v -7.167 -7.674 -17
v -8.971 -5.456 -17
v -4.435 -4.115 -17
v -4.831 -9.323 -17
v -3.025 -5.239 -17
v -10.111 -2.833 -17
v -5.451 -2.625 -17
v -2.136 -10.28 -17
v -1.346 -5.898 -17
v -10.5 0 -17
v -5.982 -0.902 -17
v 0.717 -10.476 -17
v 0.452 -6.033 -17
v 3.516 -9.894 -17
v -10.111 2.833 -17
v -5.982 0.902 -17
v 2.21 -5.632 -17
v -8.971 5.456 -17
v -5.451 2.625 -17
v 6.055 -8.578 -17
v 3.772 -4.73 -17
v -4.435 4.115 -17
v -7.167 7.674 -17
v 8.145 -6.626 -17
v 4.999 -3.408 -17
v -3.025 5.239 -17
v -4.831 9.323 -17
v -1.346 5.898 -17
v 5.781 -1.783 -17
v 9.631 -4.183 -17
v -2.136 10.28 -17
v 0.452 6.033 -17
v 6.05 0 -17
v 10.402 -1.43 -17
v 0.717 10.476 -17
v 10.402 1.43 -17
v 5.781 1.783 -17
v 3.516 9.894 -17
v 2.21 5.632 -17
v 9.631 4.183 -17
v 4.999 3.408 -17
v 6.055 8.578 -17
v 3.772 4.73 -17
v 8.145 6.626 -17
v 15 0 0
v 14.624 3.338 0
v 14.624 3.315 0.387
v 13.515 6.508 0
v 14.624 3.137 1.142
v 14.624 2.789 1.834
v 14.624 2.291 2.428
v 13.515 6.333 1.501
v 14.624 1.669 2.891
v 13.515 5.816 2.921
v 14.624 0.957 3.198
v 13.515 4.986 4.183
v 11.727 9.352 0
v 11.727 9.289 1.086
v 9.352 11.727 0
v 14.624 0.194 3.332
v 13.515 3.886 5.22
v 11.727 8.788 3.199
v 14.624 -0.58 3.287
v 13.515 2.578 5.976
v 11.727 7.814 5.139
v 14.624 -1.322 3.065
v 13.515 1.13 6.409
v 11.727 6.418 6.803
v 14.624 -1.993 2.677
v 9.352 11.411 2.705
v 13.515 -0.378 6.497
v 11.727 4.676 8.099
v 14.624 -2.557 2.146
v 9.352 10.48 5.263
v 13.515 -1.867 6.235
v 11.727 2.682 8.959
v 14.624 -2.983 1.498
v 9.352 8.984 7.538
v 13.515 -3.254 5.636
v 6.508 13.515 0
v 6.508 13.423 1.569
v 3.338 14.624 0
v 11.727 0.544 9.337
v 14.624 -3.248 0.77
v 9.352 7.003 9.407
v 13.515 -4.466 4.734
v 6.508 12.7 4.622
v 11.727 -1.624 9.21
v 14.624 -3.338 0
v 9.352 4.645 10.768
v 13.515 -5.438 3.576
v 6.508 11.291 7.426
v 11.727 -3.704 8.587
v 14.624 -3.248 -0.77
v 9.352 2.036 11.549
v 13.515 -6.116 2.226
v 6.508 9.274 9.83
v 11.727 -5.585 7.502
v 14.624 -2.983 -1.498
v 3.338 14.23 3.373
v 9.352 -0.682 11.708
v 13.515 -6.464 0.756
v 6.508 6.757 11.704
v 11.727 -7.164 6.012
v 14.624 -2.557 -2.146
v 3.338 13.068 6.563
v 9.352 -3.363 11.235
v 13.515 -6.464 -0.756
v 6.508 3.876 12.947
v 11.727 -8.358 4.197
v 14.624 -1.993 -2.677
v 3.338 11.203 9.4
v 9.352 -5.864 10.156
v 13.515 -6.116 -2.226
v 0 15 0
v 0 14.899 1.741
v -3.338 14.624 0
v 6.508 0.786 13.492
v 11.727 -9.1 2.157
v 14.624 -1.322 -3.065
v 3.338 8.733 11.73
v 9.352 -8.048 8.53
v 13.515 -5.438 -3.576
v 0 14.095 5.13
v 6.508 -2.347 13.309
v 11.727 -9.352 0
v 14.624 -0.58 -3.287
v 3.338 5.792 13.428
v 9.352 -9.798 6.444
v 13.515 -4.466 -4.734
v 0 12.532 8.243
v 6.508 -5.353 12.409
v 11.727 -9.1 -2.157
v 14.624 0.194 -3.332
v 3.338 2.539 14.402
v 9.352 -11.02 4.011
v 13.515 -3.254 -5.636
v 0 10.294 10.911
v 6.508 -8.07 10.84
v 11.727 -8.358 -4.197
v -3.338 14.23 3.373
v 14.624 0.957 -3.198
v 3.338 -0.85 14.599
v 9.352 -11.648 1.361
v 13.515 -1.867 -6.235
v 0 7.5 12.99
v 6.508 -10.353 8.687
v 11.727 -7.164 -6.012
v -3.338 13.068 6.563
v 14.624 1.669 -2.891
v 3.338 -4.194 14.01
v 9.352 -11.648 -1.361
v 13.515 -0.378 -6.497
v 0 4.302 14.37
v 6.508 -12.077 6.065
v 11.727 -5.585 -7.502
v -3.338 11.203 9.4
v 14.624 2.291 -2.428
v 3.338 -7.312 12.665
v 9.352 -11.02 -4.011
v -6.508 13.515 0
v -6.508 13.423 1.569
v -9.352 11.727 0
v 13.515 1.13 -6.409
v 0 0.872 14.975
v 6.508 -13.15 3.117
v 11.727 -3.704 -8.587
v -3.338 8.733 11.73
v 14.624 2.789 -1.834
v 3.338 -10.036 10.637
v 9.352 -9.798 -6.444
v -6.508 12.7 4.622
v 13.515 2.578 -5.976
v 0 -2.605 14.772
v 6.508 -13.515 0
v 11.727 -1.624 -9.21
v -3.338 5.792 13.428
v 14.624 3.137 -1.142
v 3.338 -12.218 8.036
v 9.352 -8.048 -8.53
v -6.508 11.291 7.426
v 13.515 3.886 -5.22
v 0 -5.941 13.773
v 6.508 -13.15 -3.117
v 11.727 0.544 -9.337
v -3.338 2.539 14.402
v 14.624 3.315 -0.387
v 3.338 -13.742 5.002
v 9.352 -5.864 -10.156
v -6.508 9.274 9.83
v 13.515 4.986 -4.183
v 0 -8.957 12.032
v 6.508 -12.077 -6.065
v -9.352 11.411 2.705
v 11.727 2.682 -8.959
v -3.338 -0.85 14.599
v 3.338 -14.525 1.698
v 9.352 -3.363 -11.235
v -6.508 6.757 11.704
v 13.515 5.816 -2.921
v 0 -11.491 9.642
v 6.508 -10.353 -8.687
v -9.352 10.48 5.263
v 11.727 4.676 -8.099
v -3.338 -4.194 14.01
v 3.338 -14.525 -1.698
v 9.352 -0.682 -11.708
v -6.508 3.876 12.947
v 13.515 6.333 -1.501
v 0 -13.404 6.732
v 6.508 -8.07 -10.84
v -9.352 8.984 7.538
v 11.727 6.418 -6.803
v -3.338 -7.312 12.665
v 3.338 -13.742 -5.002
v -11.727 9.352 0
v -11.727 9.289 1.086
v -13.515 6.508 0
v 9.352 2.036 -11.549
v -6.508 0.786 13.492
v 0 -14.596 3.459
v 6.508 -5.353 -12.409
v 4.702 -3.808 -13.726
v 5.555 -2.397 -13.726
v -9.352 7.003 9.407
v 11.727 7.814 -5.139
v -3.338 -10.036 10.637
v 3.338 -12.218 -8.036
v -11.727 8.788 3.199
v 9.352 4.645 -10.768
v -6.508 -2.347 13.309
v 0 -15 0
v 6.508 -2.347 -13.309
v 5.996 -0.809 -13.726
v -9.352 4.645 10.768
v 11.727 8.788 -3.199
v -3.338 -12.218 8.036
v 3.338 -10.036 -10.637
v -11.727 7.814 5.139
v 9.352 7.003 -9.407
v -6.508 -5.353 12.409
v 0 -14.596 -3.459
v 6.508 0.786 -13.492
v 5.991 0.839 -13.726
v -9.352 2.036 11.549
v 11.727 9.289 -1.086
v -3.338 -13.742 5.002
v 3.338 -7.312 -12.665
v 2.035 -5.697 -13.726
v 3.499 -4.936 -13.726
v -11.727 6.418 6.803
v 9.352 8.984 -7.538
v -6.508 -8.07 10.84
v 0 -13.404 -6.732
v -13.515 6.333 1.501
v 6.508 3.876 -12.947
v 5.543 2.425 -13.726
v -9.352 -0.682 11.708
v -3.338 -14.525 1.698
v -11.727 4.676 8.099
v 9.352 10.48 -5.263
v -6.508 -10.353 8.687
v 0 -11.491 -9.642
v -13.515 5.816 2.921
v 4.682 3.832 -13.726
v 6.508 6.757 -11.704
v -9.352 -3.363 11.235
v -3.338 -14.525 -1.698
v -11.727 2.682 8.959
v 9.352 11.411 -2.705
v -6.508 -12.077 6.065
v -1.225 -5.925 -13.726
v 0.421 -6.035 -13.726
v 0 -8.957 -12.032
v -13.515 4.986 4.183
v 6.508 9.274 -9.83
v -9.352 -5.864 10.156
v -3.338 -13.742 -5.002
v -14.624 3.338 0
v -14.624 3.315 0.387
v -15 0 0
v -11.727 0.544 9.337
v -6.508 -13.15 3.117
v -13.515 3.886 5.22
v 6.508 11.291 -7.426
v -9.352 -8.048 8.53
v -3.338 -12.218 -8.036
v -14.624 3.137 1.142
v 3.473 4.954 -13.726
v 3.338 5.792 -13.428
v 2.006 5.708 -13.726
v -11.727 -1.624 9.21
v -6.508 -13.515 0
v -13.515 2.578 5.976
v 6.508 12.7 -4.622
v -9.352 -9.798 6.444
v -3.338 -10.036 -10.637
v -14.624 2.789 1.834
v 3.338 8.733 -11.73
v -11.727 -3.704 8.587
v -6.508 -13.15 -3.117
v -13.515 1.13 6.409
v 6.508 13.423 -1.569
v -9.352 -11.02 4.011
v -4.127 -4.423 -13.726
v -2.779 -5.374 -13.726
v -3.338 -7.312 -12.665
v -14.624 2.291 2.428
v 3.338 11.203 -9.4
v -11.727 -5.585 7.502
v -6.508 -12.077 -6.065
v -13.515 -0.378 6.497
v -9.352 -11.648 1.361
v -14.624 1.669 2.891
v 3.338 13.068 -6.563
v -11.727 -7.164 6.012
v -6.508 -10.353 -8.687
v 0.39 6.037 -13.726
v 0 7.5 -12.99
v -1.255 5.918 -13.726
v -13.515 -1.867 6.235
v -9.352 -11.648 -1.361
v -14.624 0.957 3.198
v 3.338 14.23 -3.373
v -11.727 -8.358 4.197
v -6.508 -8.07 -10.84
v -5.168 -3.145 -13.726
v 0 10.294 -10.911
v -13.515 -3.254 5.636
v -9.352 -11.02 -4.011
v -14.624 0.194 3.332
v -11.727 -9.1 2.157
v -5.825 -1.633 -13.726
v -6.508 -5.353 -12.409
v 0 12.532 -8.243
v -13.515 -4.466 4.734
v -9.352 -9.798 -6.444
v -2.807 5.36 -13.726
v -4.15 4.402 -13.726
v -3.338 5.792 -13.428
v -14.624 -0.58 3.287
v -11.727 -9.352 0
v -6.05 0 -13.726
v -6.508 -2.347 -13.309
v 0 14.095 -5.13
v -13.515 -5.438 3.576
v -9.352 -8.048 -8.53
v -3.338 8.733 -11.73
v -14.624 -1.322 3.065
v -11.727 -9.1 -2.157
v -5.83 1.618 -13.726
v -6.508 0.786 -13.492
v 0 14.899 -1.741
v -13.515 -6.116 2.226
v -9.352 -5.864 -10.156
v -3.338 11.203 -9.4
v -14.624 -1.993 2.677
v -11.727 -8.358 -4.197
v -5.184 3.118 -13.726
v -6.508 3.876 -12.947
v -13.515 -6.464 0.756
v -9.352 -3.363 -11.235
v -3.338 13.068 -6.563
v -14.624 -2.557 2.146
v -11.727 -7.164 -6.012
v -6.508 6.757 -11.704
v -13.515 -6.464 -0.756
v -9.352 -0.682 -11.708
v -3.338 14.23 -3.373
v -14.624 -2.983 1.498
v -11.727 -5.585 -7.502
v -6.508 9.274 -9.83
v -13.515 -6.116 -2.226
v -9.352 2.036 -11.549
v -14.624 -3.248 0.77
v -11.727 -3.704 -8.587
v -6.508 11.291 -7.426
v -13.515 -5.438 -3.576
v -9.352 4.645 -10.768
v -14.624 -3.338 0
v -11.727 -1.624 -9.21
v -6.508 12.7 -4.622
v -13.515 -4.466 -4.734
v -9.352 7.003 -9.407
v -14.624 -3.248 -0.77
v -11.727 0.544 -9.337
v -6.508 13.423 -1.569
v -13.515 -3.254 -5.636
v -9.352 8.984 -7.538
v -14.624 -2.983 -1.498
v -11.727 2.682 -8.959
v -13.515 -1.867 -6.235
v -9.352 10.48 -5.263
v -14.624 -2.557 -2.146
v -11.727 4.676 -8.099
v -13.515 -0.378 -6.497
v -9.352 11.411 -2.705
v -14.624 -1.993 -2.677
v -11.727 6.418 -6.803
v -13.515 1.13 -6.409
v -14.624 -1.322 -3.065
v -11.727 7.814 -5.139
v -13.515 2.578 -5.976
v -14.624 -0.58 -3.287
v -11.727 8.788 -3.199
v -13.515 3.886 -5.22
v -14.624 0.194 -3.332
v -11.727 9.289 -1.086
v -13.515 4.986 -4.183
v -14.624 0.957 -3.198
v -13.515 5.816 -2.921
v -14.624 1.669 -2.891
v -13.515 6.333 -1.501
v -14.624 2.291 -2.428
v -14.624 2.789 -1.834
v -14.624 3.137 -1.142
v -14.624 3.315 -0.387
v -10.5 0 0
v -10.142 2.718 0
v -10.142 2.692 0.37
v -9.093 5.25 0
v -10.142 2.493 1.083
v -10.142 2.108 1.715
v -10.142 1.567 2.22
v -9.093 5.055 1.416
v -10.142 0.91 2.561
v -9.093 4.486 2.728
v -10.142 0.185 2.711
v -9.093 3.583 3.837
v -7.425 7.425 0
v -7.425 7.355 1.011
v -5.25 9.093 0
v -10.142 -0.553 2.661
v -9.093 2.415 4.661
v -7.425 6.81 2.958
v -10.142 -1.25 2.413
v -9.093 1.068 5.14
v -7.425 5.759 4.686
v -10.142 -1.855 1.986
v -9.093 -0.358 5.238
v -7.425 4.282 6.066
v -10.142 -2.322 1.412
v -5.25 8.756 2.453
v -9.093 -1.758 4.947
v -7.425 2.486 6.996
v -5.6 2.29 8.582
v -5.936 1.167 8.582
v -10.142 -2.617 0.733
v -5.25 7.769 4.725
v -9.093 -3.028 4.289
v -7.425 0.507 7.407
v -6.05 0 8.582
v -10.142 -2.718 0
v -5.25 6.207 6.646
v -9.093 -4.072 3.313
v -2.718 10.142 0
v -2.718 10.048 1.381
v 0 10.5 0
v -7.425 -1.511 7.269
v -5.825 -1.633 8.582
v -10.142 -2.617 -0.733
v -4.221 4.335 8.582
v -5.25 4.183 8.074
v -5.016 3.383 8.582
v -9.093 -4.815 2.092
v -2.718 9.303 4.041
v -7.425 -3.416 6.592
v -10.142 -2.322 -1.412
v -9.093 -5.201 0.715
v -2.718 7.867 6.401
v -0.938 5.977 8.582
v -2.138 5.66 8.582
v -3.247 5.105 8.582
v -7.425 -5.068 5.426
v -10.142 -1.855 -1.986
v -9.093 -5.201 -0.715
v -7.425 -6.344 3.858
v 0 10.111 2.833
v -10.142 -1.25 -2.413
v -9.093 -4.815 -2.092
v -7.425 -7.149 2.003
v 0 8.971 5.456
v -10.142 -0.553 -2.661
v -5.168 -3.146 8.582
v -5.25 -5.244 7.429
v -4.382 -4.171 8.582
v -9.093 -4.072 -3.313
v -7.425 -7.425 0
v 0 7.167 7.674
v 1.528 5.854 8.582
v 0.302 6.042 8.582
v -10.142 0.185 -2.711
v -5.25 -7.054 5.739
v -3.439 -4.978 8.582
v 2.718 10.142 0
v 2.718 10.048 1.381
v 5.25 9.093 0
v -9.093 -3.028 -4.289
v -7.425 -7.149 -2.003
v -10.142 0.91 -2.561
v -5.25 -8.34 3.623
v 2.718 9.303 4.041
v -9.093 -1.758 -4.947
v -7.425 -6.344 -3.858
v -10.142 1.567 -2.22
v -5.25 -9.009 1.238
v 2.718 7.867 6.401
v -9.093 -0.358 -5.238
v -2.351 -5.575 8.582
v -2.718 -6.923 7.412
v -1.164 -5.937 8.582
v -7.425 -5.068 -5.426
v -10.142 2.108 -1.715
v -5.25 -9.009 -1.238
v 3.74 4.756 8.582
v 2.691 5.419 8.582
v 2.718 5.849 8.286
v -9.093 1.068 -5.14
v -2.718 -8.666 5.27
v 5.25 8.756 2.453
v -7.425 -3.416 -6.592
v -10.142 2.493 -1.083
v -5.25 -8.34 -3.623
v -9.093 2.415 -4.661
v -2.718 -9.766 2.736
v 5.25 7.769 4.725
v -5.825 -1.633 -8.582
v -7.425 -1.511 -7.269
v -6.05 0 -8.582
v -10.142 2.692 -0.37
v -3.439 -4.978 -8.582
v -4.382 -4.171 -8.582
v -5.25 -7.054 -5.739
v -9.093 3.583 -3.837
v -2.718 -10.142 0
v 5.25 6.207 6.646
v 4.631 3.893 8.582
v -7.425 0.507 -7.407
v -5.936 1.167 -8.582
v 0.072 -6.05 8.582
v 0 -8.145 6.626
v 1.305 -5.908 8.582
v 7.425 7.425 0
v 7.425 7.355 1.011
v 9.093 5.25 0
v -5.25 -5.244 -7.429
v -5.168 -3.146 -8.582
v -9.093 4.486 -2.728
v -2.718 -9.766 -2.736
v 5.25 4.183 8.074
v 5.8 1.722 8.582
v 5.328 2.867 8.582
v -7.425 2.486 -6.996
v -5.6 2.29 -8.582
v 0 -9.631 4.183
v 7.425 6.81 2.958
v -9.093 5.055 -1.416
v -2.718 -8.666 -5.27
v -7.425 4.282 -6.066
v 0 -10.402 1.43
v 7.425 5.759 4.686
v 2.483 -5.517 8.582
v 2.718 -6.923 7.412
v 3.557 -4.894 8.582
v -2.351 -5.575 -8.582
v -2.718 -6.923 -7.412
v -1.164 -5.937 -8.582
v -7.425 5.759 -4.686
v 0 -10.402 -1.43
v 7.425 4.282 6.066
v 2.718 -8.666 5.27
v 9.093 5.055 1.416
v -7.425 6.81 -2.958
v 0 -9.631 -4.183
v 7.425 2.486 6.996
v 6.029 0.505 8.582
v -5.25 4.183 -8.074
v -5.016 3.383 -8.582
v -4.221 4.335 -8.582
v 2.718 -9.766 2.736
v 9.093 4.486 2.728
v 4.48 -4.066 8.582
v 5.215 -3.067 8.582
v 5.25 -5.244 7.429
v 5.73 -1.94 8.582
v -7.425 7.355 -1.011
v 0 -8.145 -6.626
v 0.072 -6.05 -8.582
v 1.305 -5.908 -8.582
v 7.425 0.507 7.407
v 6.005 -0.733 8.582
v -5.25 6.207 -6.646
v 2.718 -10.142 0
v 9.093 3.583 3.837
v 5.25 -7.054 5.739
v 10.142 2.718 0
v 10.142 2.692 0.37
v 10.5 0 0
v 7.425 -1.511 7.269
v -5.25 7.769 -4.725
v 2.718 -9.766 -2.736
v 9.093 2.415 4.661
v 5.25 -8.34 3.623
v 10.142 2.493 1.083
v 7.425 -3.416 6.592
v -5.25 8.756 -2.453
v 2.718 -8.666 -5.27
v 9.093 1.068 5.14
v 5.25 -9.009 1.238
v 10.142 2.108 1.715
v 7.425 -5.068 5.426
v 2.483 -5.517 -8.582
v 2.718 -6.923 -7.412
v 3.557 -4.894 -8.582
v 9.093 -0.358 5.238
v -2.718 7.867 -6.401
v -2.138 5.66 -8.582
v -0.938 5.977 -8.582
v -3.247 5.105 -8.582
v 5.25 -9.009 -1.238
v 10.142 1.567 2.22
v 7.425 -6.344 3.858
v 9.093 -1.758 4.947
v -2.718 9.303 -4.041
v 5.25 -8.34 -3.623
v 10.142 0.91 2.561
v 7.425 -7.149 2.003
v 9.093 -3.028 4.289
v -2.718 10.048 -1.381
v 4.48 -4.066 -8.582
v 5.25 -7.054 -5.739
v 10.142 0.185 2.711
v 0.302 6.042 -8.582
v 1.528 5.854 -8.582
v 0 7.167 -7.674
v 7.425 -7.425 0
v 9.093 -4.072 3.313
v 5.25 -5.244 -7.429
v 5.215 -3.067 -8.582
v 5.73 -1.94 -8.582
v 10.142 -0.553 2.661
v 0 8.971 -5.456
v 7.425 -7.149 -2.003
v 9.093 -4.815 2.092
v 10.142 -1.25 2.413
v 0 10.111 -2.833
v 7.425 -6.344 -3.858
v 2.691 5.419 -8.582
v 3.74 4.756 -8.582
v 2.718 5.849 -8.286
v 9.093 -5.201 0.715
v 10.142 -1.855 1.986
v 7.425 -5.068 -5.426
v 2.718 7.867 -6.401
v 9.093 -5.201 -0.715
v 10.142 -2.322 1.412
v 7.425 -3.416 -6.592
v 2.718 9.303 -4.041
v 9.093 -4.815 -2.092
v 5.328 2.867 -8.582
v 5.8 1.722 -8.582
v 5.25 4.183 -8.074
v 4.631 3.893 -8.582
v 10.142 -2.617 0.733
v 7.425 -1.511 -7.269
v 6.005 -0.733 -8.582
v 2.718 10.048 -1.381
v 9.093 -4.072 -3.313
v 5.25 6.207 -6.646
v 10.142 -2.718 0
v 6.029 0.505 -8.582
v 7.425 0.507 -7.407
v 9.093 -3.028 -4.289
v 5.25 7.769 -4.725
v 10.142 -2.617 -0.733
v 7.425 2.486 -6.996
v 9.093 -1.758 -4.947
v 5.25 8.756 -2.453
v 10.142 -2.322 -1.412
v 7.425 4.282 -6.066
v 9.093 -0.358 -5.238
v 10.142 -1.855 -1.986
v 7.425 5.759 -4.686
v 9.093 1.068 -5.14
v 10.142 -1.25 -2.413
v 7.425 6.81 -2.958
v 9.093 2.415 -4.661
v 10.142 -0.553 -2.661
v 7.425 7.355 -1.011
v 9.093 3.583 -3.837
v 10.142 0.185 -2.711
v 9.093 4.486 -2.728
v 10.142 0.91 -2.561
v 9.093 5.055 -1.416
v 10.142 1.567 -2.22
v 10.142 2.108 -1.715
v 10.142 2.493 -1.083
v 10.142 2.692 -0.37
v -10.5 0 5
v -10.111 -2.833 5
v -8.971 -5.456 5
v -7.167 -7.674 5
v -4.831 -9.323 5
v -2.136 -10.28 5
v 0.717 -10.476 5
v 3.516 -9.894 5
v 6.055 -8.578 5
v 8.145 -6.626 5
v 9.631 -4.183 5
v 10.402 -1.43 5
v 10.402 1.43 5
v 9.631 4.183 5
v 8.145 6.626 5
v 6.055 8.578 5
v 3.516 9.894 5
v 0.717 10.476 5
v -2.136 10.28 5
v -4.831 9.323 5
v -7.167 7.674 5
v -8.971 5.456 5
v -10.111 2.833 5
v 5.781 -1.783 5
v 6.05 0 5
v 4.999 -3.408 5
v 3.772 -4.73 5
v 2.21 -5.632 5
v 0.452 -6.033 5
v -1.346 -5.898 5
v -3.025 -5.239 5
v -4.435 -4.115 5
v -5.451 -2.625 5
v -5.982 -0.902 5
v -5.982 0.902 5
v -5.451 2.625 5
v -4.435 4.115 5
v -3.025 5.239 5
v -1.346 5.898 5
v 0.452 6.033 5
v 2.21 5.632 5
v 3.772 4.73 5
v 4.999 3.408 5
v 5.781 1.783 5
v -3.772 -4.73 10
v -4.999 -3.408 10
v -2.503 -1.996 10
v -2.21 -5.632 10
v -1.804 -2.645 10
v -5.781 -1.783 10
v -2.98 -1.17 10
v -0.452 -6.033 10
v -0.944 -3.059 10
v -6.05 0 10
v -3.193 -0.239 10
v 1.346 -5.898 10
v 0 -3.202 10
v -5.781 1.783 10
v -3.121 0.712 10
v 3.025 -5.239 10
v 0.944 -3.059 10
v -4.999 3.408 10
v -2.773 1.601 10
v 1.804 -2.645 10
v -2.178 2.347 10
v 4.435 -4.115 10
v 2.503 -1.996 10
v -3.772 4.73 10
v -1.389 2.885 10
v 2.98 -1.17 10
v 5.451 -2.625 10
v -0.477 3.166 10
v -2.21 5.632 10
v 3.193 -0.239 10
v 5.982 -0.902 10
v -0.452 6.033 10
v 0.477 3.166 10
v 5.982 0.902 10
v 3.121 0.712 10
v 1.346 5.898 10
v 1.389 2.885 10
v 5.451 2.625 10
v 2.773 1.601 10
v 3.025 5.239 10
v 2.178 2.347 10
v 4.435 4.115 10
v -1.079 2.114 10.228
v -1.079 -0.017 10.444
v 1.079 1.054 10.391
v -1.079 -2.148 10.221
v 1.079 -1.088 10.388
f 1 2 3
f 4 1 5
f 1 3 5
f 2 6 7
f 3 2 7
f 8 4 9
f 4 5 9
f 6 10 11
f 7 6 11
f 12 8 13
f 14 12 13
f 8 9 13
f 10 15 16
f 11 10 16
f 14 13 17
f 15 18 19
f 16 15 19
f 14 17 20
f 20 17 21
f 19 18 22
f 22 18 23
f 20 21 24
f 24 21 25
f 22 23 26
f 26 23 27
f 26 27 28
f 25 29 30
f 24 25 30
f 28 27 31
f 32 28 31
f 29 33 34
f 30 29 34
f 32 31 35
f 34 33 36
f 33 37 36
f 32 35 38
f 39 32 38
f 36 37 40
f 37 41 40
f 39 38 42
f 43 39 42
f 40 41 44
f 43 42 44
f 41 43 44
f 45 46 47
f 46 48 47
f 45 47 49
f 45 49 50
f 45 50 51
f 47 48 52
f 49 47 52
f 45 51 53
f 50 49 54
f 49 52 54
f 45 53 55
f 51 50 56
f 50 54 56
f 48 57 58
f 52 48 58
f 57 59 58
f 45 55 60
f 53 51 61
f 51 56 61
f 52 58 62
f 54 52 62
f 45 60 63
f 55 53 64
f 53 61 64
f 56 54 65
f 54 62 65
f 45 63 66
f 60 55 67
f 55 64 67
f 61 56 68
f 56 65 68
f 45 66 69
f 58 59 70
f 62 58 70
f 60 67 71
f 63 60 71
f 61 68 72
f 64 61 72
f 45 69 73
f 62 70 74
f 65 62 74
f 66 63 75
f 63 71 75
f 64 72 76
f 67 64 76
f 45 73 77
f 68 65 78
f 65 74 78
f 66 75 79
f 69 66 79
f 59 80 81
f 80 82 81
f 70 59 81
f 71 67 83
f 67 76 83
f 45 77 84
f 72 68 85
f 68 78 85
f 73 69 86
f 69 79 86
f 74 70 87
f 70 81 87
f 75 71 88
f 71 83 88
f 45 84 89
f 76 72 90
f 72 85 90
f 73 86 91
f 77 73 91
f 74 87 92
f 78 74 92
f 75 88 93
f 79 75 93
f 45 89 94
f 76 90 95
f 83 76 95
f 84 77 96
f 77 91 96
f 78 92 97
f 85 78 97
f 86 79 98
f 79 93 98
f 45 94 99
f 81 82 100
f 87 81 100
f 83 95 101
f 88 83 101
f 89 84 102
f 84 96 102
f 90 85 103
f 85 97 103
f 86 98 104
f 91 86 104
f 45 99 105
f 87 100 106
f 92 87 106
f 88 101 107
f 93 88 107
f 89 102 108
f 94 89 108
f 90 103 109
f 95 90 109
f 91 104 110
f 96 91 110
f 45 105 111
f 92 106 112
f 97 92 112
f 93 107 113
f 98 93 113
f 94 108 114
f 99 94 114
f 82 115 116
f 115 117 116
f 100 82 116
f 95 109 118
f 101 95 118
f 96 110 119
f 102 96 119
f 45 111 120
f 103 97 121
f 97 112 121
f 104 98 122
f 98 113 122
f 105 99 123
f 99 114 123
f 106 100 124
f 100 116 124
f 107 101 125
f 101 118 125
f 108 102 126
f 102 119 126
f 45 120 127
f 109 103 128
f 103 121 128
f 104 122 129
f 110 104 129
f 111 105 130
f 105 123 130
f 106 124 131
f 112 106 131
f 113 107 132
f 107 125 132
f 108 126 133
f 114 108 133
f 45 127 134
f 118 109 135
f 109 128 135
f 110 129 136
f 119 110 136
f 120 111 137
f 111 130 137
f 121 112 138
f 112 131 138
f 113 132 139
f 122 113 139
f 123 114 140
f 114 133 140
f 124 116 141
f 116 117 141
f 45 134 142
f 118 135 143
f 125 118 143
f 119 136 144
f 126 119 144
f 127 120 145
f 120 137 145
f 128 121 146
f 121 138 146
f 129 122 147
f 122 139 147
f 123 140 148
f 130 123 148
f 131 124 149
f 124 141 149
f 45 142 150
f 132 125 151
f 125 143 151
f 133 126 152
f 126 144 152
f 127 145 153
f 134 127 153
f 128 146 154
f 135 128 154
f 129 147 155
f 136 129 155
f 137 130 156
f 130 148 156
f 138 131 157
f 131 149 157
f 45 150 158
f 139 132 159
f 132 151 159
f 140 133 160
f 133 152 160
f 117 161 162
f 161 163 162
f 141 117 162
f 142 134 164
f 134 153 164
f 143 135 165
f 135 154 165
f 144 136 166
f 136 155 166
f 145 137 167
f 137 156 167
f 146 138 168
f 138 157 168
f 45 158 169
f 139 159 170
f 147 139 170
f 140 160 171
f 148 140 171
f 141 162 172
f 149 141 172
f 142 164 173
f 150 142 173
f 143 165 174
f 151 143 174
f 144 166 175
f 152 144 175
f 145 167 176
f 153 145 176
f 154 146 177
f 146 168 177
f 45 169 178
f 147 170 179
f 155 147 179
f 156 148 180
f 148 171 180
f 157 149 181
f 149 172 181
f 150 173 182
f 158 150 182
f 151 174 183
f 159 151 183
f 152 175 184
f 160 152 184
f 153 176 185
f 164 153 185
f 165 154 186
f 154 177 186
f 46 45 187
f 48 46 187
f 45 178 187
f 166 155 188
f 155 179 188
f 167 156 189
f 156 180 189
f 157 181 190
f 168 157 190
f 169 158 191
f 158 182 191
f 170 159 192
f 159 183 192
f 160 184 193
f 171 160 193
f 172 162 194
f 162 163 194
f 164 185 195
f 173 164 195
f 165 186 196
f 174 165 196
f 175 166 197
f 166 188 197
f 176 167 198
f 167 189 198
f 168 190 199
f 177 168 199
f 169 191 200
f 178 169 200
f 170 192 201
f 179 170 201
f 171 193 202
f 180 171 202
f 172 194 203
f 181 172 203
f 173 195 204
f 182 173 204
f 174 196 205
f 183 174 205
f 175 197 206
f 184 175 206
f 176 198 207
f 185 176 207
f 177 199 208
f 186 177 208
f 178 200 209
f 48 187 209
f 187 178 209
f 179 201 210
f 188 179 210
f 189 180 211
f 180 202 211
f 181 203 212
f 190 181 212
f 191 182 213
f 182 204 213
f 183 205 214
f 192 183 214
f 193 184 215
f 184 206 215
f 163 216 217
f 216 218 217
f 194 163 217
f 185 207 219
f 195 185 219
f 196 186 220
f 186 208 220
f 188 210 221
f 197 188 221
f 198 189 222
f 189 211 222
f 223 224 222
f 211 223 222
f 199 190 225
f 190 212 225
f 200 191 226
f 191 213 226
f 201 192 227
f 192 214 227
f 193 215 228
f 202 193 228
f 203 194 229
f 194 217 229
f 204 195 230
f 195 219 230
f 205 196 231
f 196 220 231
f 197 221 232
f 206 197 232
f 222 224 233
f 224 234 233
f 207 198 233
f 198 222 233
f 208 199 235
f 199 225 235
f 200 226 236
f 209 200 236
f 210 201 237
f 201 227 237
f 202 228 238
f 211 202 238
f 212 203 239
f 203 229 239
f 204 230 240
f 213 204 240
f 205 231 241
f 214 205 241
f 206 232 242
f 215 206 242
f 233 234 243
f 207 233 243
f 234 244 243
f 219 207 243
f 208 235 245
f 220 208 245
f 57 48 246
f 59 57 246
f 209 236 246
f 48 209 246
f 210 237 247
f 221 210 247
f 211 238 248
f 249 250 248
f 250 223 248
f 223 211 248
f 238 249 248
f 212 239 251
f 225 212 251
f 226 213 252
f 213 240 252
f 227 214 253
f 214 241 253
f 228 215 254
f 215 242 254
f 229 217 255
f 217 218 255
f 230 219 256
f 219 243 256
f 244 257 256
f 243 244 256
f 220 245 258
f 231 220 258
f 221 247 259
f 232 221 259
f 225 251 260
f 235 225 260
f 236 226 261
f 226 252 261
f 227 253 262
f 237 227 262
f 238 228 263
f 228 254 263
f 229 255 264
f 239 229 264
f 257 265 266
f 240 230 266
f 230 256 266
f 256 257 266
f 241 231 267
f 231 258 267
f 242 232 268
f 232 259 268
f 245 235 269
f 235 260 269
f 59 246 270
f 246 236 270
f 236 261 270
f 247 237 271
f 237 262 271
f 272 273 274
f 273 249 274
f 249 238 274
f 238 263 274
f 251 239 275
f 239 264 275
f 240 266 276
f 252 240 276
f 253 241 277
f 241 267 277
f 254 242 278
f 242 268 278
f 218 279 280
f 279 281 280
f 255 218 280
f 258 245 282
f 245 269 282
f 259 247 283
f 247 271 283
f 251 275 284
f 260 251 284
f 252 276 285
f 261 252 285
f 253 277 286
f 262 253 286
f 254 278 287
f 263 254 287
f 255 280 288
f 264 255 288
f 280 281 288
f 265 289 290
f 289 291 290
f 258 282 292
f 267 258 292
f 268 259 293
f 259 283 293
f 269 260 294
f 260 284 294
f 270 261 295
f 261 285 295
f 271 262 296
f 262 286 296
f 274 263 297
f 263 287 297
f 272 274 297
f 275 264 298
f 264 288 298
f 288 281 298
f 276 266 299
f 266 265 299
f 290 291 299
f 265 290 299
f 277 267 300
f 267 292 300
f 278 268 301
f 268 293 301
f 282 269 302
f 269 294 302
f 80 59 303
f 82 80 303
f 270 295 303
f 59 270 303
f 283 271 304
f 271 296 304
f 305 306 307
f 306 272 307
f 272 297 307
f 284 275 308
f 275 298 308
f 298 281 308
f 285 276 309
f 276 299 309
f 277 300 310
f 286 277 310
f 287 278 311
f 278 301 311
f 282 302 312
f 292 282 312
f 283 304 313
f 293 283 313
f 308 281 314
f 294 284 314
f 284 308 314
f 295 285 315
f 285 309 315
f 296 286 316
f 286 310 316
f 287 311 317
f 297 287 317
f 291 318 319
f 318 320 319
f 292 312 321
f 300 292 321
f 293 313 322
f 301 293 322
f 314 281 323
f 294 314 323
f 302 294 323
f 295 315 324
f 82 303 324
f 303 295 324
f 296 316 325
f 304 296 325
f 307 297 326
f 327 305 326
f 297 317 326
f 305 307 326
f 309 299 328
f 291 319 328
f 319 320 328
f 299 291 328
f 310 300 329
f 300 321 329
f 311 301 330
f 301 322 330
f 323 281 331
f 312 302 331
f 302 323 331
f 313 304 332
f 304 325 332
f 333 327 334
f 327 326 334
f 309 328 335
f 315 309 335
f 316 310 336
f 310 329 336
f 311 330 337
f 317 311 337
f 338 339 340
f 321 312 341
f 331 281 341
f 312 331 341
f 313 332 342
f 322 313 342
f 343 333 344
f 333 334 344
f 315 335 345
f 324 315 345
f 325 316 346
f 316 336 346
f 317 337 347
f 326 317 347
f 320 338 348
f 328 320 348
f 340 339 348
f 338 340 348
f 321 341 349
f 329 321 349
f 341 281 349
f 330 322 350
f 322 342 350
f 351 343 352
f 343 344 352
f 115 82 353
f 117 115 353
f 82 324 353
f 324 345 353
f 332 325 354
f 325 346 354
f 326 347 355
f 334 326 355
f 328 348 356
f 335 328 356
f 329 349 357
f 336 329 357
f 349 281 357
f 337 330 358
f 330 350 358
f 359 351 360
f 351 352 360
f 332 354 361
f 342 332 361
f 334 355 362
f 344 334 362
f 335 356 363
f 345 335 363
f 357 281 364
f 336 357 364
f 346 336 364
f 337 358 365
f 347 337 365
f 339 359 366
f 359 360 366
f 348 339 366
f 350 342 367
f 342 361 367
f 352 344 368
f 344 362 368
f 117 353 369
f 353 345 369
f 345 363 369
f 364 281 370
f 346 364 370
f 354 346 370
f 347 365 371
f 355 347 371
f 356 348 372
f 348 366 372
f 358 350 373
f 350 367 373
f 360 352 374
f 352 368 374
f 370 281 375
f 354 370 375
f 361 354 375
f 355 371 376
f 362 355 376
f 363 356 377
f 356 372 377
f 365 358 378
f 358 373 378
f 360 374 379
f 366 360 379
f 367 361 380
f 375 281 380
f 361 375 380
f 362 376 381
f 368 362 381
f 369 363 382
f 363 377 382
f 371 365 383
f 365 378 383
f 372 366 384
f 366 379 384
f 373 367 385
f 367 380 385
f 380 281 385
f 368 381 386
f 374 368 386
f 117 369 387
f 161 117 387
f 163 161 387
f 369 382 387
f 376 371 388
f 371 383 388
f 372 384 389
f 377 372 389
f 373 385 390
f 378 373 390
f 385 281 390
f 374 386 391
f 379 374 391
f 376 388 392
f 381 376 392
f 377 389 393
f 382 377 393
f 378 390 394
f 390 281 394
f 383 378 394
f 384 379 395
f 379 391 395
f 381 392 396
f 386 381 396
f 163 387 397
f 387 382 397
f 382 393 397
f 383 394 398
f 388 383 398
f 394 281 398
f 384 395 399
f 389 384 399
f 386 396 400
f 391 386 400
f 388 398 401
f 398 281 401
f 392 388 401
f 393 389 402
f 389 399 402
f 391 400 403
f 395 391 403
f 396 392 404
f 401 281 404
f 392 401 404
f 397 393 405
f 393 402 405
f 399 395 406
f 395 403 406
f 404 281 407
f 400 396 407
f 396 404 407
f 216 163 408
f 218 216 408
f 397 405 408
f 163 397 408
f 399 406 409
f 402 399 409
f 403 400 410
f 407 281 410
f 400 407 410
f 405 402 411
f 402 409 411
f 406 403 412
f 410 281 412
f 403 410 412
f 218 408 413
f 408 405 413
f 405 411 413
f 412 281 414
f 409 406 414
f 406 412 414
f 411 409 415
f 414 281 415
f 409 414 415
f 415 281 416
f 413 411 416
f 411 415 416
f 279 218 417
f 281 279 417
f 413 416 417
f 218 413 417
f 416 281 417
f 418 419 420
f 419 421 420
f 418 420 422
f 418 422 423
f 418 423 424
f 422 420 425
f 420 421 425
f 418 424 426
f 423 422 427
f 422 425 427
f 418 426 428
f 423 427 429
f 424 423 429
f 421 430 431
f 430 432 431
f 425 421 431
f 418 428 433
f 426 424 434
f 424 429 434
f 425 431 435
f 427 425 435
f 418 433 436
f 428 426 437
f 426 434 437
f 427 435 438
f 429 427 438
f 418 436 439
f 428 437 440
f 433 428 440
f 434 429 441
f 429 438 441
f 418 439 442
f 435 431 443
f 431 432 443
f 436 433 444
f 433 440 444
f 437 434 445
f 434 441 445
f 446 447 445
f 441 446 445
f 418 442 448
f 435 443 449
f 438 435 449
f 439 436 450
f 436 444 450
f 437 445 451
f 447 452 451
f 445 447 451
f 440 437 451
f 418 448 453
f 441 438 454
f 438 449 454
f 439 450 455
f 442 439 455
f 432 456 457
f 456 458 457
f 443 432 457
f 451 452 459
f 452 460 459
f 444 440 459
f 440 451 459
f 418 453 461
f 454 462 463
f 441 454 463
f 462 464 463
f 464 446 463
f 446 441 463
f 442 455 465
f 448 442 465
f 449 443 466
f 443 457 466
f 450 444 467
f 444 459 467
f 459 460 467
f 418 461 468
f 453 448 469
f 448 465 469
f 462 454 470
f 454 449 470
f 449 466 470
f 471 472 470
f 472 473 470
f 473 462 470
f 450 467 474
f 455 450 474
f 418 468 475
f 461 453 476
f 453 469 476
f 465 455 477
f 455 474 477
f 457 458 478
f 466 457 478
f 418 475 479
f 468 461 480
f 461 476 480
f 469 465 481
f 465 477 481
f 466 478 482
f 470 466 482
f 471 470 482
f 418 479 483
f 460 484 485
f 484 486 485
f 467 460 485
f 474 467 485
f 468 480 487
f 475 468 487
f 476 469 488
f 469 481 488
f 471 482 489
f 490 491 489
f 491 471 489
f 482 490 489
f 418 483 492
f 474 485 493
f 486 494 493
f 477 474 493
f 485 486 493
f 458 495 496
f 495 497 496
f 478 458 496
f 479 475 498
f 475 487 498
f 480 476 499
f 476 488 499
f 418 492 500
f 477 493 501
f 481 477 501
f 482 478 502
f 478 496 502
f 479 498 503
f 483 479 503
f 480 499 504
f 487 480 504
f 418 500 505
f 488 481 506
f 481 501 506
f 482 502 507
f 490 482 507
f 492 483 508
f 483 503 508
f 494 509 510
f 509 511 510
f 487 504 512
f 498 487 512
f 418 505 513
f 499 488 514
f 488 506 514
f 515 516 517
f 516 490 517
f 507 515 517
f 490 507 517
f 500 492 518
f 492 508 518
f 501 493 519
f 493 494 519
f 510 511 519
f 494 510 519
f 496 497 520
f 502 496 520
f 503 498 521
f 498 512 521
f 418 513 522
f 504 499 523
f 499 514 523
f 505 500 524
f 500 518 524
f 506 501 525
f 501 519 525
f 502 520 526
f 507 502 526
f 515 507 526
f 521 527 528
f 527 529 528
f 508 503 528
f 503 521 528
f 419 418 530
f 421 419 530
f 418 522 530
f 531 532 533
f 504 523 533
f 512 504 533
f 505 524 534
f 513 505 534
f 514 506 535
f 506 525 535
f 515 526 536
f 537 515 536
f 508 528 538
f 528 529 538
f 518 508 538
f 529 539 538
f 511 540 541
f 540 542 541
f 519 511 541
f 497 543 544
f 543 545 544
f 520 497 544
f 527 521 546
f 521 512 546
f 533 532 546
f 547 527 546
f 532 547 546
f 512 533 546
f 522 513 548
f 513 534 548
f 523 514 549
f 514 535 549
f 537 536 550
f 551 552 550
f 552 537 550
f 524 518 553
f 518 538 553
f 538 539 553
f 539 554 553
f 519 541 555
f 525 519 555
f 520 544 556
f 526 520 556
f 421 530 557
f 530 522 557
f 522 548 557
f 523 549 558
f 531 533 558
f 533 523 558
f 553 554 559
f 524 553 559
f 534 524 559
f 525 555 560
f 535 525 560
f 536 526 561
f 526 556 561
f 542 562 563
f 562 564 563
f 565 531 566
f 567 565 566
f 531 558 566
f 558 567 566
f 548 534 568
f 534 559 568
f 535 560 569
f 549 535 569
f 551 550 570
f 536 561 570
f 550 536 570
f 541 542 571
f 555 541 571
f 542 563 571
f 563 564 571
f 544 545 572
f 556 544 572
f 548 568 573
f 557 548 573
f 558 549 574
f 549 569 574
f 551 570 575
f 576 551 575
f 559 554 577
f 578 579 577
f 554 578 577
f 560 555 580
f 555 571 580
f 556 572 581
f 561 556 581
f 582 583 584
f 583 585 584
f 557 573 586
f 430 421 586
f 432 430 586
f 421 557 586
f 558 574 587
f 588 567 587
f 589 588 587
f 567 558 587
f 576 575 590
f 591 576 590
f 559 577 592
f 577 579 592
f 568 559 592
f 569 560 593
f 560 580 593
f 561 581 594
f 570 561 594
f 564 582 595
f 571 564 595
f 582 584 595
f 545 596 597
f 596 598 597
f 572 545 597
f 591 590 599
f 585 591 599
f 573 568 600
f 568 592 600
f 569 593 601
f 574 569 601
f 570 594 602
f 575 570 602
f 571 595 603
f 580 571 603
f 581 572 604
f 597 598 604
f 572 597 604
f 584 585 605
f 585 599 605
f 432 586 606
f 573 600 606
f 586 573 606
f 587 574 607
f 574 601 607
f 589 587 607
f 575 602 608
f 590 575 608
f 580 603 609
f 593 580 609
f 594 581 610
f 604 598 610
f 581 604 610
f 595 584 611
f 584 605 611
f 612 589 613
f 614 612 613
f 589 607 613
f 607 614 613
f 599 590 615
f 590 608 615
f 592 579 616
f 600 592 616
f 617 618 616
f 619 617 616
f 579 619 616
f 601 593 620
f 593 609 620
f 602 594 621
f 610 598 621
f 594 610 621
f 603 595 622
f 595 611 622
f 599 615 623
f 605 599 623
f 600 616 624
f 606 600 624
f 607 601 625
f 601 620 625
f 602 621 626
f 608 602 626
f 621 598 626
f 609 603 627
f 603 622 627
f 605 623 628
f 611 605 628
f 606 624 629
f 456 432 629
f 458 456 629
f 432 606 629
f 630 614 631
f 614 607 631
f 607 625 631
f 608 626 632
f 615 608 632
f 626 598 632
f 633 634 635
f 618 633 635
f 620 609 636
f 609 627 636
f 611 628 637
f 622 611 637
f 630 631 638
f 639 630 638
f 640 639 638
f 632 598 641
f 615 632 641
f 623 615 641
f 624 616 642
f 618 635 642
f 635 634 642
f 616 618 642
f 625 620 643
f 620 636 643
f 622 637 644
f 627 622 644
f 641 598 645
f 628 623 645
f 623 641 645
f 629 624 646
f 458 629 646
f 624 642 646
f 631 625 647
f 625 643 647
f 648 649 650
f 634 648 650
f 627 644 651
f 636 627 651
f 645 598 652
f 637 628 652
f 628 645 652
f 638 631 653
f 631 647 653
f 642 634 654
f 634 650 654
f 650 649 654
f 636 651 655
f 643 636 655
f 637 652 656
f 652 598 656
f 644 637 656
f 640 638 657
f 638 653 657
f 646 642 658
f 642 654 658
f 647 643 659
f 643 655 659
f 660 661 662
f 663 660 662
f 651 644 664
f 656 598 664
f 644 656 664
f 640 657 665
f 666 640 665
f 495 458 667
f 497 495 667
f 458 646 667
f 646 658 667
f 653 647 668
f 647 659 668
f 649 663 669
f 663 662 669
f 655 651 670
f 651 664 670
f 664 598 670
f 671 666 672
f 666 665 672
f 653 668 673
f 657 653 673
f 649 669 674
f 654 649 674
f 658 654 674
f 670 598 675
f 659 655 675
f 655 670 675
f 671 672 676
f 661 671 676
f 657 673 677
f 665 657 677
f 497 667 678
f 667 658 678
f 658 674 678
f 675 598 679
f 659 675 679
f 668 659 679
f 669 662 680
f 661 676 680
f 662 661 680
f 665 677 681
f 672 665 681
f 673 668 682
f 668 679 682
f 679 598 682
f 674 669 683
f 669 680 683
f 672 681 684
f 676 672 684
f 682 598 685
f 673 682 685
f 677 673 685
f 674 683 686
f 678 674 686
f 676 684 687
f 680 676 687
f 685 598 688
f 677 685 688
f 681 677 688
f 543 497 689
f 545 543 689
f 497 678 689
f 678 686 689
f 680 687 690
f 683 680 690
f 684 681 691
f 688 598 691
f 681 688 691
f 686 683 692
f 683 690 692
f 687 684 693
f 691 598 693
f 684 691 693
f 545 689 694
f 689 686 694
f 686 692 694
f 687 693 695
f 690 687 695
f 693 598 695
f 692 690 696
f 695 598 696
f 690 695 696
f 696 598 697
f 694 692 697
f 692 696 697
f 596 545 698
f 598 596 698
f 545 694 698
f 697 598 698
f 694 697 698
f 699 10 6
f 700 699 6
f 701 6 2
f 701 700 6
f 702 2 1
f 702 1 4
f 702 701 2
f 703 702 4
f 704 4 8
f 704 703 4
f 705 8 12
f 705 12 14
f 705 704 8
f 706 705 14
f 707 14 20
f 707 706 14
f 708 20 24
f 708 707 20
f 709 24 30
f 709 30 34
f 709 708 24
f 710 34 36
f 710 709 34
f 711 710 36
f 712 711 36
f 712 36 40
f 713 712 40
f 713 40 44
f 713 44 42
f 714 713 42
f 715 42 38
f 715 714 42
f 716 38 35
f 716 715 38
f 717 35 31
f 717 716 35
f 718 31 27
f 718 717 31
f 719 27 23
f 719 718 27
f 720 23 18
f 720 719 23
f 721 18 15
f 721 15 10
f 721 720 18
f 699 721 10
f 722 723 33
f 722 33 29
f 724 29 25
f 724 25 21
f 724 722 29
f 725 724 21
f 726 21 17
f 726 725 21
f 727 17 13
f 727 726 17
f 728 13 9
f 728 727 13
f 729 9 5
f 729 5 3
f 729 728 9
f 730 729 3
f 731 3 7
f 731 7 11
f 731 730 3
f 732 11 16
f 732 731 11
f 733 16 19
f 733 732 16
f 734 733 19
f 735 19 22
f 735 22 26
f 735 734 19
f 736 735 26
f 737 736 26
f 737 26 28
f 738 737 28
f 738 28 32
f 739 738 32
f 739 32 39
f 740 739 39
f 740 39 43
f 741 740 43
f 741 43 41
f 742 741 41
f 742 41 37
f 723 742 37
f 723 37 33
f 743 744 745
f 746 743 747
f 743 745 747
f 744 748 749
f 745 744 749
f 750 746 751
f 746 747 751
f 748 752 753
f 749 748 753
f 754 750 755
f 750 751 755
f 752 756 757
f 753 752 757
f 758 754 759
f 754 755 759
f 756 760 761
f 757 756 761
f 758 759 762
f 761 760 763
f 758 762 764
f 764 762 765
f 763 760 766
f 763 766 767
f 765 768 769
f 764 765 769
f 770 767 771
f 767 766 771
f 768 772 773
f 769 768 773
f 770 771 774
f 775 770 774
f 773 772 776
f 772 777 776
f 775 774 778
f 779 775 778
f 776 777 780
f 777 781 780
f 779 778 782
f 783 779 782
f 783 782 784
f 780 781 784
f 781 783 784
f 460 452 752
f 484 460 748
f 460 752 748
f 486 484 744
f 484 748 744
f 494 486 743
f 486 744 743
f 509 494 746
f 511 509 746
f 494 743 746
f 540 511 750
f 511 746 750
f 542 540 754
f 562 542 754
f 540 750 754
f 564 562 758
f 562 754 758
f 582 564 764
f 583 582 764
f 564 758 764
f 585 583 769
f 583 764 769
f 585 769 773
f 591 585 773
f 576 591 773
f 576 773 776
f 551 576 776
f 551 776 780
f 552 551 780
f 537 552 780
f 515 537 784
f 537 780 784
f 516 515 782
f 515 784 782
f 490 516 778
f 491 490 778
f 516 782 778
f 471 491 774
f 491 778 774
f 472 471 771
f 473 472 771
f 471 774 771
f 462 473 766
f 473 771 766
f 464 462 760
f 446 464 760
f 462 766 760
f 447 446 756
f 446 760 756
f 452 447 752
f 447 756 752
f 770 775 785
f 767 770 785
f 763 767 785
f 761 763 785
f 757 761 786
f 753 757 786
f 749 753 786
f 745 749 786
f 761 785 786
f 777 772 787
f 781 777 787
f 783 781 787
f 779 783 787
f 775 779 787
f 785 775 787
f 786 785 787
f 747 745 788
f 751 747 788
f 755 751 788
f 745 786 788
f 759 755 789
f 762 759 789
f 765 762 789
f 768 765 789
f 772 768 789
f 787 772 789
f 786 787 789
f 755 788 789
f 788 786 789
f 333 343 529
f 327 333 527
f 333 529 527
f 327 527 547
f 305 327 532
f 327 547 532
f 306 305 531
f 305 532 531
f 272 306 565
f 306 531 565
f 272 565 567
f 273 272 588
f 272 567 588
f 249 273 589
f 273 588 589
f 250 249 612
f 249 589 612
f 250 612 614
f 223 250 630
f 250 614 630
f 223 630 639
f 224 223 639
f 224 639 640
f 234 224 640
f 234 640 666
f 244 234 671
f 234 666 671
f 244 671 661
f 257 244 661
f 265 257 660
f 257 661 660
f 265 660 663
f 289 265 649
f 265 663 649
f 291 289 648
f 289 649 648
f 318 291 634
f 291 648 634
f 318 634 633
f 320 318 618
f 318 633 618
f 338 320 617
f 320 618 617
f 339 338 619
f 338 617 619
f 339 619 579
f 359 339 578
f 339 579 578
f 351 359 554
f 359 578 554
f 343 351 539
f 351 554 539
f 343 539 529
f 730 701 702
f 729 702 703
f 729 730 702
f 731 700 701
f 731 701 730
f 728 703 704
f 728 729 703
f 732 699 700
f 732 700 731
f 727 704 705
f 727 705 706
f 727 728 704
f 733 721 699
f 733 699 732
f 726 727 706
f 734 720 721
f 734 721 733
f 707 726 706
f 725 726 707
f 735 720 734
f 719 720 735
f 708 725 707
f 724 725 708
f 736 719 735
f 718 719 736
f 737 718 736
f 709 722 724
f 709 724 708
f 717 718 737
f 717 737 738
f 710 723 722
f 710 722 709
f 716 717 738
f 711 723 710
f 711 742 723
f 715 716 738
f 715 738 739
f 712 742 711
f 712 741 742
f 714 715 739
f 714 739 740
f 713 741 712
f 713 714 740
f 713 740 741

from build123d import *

# Parameters (mm, degrees)
F1_DEPTH      = 5
F1_DEPTH_BACK = 17
F2_DEPTH      = 10
F2_DEPTH_BACK = 25


with BuildPart() as f1:
    # F0 (on Top) → F1 (new body, two sides)
    with BuildSketch(Plane.XY) as f1_sk:
        with BuildLine():
            Line((6.05, 0), (10.5, 0))
            ThreePointArc((10.5, 0), (0, 10.5), (-10.5, 0))
            Line((-10.5, 0), (-6.05, 0))
            ThreePointArc((-6.05, 0), (0, 6.05), (6.05, 0))
        make_face()
        with BuildLine():
            ThreePointArc((-10.5, 0), (0, -10.5), (10.5, 0))
            Line((10.5, 0), (6.05, 0))
            ThreePointArc((6.05, 0), (0, -6.05), (-6.05, 0))
            Line((-6.05, 0), (-10.5, 0))
        make_face()
    extrude(amount=F1_DEPTH)
    extrude(f1_sk.sketch, amount=-F1_DEPTH_BACK)


with BuildPart() as f2:
    # F0 (on Top) → F2 (new body, two sides)
    with BuildSketch(Plane.XY) as f2_sk:
        with BuildLine():
            Line((-6.05, 0), (6.05, 0))
            ThreePointArc((6.05, 0), (0, 6.05), (-6.05, 0))
        make_face()
        with BuildLine():
            ThreePointArc((-6.05, 0), (0, -6.05), (6.05, 0))
            Line((6.05, 0), (-6.05, 0))
        make_face()
    extrude(amount=F2_DEPTH)
    extrude(f2_sk.sketch, amount=-F2_DEPTH_BACK)


with BuildPart() as f3:
    # F0 (on Top) → F3 (revolve)
    with BuildSketch(Plane.XY):
        with BuildLine():
            Line((10.5, 0), (15, 0))
            ThreePointArc((15, 0), (0, 15), (-15, 0))
            Line((-15, 0), (-10.5, 0))
            ThreePointArc((-10.5, 0), (0, 10.5), (10.5, 0))
        make_face()
    revolve(axis=Axis((0, 0, 0), (1, 0, 0)))

    # F4: cut F2
    add(f2.part, mode=Mode.SUBTRACT)


with BuildPart() as f1_1:
    add(f1.part)

    # F4: cut F2
    add(f2.part, mode=Mode.SUBTRACT)


solid = Compound([f3.part, f1_1.part])
